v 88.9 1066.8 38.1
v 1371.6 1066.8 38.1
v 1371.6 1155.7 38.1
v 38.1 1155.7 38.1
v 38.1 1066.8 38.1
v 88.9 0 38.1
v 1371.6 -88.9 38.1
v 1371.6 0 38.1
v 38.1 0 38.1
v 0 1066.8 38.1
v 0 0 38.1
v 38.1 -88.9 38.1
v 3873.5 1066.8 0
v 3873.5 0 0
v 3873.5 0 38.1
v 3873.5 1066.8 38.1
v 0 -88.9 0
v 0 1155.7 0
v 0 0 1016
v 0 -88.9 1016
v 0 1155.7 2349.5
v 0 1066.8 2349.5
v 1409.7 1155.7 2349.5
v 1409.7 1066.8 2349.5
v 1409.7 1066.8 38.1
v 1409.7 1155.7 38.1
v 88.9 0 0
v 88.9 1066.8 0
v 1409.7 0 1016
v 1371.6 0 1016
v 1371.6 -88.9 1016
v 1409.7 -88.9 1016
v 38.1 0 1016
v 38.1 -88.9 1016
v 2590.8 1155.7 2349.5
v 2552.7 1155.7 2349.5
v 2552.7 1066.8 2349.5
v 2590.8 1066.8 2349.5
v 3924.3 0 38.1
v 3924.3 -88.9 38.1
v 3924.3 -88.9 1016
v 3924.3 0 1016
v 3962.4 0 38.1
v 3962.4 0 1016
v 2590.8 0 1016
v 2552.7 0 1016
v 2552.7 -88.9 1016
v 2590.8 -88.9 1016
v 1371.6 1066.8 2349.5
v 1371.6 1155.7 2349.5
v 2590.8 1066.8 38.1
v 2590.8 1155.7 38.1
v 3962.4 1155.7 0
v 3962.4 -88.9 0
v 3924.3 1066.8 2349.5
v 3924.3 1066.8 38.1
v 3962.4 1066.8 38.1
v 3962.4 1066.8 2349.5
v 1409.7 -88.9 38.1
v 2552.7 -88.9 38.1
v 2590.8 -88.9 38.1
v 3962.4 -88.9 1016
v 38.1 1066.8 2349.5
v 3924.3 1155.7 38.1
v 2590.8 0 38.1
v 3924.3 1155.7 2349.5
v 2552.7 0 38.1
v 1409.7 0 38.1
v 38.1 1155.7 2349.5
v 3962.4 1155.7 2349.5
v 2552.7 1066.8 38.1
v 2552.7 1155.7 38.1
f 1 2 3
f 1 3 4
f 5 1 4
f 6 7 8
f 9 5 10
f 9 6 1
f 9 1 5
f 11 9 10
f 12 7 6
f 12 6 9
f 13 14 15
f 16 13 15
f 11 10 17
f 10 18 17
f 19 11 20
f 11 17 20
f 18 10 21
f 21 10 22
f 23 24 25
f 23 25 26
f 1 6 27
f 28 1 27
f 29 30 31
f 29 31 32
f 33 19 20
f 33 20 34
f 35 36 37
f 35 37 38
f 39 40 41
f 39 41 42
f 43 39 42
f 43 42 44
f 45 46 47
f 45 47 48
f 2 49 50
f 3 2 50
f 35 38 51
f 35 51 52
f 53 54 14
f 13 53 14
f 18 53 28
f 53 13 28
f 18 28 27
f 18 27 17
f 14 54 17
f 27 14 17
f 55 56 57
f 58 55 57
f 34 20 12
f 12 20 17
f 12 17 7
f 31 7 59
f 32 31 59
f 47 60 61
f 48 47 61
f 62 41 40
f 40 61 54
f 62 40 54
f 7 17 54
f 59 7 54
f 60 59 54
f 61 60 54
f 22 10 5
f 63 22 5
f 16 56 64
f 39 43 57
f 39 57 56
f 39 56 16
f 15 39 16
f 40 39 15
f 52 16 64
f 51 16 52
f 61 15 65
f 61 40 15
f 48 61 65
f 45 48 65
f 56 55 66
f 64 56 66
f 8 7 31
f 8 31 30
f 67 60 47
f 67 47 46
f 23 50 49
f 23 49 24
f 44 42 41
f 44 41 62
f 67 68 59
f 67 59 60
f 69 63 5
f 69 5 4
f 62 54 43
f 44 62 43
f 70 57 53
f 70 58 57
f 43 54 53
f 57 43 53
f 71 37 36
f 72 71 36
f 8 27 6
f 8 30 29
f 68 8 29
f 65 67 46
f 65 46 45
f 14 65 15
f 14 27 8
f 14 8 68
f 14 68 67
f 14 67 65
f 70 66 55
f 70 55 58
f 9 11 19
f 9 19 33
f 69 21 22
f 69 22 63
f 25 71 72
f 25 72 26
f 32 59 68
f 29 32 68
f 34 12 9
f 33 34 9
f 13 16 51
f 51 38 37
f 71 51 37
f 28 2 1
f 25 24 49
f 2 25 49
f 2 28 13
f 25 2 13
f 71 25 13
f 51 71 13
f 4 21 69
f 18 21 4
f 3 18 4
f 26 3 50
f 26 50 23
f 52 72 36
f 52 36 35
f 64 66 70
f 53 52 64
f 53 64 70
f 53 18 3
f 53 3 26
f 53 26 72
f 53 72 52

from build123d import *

# Parameters (mm, degrees)
F0_W      = 3962.4
F0_H      = 38.1
F1_DEPTH  = 88.9
F2_W      = 38.1
F2_H      = 88.9
F3_DEPTH  = 977.9
F5_DEPTH  = 1066.8
F7_W      = 3962.4
F7_H      = 38.1
F8_DEPTH  = 88.9
F9_W      = 38.1
F9_H      = 88.9
F10_DEPTH = 2311.4


with BuildPart() as f1:
    # F0 (on Front) → F1 (new body)
    with BuildSketch(Plane.XZ):
        with Locations((1981.2, 19.05)):
            Rectangle(F0_W, F0_H)
    extrude(amount=F1_DEPTH)

    # F2 (on face) → F3 (join)
    with BuildSketch(Plane.XY.offset(38.1)):
        with Locations((19.05, -44.45)):
            Rectangle(F2_W, F2_H)
        with Locations((1390.65, -44.45)):
            Rectangle(F2_W, F2_H)
        with Locations((2571.75, -44.45)):
            Rectangle(F2_W, F2_H)
        with Locations((3943.35, -44.45)):
            Rectangle(F2_W, F2_H)
    extrude(amount=F3_DEPTH)

    # F4 (on face) → F5 (join)
    with BuildSketch(Plane(origin=(0, 0, 0), x_dir=(-1, 0, 0), z_dir=(0, 1, 0))):
        Polygon((-88.9, 38.1), (-88.9, 0), (0, 0), (0, 38.1), (-38.1, 38.1), align=None)
        Polygon((-3962.4, 38.1), (-3962.4, 0), (-3873.5, 0), (-3873.5, 38.1), (-3924.3, 38.1), align=None)
    extrude(amount=F5_DEPTH)

    # F7 (on offset) → F8 (join)
    with BuildSketch(Plane(origin=(0, 1066.8, 0), x_dir=(-1, 0, 0), z_dir=(0, 1, 0))):
        with Locations((-1981.2, 19.05)):
            Rectangle(F7_W, F7_H)
    extrude(amount=F8_DEPTH)

    # F9 (on face) → F10 (join)
    with BuildSketch(Plane.XY.offset(38.1)):
        with Locations((3943.35, 1111.25)):
            Rectangle(F9_W, F9_H)
        with Locations((2571.75, 1111.25)):
            Rectangle(F9_W, F9_H)
        with Locations((1390.65, 1111.25)):
            Rectangle(F9_W, F9_H)
        with Locations((19.05, 1111.25)):
            Rectangle(F9_W, F9_H)
    extrude(amount=F10_DEPTH)


solid = f1.part
